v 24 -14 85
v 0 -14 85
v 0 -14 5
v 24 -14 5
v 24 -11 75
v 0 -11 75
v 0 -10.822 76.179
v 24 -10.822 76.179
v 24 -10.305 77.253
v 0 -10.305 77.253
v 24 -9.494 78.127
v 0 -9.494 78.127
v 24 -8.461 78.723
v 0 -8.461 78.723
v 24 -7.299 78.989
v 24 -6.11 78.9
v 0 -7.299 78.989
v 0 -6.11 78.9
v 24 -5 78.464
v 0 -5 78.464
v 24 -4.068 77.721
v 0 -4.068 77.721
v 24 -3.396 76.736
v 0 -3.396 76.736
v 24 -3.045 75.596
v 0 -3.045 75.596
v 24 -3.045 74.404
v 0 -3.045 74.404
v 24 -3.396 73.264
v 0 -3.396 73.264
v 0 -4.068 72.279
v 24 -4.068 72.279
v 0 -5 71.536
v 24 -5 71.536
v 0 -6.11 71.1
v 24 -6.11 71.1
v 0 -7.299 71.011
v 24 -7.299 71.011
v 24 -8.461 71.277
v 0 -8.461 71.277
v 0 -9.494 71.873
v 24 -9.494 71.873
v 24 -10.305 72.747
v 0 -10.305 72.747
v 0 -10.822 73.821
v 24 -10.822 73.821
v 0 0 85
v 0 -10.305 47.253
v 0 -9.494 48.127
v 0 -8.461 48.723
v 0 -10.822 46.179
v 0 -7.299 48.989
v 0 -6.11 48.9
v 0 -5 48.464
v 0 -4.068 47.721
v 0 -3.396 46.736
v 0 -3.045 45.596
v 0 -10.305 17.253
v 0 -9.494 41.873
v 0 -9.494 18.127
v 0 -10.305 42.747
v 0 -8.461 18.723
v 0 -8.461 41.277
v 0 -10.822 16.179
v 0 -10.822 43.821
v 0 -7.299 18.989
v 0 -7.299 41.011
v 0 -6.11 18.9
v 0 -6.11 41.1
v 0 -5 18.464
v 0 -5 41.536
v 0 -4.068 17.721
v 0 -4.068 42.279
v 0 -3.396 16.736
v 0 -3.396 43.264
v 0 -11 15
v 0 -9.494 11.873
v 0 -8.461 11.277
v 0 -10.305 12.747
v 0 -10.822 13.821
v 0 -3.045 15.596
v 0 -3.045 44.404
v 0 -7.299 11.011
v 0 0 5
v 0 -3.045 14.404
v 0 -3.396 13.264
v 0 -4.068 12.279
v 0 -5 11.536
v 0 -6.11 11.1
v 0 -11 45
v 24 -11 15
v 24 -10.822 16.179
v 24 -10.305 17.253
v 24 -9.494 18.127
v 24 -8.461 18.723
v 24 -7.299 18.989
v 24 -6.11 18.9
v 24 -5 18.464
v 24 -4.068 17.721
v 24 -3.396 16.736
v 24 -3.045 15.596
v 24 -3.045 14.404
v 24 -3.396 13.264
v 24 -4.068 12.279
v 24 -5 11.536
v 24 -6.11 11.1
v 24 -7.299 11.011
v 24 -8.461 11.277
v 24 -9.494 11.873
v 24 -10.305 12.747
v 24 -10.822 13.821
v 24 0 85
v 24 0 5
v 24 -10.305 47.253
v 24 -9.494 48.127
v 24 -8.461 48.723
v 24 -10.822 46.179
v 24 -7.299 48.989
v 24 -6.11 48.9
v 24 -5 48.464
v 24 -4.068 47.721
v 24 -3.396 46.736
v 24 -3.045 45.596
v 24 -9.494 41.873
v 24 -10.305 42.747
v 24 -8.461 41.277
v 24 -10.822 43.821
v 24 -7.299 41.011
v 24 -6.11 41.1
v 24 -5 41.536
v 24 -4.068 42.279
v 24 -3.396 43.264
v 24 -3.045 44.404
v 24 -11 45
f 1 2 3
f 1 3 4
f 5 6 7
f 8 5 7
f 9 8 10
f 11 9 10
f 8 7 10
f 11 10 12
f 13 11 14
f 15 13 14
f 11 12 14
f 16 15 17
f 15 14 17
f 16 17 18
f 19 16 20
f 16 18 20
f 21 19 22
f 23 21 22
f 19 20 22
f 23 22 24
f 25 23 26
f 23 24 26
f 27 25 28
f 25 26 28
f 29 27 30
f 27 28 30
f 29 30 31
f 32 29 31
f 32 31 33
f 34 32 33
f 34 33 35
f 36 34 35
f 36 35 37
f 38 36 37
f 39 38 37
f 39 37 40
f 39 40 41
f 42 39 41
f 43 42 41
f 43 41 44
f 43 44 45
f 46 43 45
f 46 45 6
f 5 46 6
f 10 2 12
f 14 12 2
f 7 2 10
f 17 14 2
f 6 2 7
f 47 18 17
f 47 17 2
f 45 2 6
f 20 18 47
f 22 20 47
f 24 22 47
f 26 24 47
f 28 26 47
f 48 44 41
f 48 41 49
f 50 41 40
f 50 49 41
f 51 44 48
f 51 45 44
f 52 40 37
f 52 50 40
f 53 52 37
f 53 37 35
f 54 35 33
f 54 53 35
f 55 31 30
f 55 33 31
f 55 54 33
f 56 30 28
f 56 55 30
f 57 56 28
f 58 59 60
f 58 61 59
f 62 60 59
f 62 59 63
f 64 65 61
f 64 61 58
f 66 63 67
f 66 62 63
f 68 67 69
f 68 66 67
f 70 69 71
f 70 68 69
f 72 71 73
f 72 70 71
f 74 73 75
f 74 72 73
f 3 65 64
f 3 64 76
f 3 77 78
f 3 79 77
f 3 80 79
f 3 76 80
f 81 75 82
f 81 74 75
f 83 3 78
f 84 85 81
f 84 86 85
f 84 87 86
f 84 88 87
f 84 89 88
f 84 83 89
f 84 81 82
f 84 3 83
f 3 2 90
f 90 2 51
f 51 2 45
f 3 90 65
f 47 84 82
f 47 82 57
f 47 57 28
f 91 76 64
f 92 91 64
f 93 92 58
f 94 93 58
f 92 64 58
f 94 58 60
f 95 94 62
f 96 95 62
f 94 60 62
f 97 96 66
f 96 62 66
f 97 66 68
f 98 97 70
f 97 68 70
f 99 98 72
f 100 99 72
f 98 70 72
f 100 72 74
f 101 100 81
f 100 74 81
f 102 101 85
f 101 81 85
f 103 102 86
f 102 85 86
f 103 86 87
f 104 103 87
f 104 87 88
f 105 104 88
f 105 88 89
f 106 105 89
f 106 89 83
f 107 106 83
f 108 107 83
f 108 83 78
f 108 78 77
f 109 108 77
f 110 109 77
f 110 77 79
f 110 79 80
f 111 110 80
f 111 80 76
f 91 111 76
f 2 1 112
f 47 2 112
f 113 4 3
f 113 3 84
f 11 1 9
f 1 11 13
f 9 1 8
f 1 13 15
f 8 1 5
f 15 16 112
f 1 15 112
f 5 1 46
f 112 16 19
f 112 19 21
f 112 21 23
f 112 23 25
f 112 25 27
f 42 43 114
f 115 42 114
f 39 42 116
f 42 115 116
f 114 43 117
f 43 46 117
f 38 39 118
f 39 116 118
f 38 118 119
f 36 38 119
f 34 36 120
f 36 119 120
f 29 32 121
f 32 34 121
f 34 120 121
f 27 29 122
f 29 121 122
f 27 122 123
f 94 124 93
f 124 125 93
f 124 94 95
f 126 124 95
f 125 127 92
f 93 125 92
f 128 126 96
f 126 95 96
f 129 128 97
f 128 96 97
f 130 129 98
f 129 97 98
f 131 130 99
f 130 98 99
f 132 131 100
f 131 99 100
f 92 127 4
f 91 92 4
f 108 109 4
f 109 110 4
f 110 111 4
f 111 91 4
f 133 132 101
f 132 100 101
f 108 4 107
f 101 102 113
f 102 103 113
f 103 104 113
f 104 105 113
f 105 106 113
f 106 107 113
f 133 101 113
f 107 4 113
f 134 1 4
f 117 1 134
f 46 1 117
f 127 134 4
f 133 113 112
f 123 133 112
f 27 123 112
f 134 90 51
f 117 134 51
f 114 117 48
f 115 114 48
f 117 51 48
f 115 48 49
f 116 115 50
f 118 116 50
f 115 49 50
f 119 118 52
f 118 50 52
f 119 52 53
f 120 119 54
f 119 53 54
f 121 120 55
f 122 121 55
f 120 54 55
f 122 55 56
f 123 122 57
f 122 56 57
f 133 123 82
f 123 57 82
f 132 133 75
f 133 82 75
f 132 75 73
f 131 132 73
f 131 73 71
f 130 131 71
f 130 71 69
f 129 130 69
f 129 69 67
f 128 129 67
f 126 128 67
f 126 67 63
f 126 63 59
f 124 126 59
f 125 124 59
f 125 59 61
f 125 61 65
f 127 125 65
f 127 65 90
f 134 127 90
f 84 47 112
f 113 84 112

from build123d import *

# Parameters (mm, degrees)
SKETCH_1_W          = 24
SKETCH_1_H          = 14
EXTRUDE_1_DEPTH     = 90
SKETCH_2_R          = 4
CUT_EXTRUDE_1_DEPTH = 90
SKETCH_3_W          = 5
SKETCH_3_H          = 14
CUT_EXTRUDE_2_DEPTH = 95.191294715


with BuildPart() as part:
    # 草图1 → 拉伸1 (new body)
    with BuildSketch(Plane.XY):
        with Locations((12, -7)):
            Rectangle(SKETCH_1_W, SKETCH_1_H)
    extrude(amount=EXTRUDE_1_DEPTH)

    # 草图2 → 切除-拉伸1 (cut)
    with BuildSketch(Plane.ZY):
        with Locations(Location((15, -7, 0), (0, 0, 270))):
            Circle(SKETCH_2_R)
        with Locations(Location((45, -7, 0), (0, 0, 270))):
            Circle(SKETCH_2_R)
        with Locations(Location((75, -7, 0), (0, 0, 270))):
            Circle(SKETCH_2_R)
    extrude(amount=-CUT_EXTRUDE_1_DEPTH, mode=Mode.SUBTRACT)

    # 草图3 → 切除-拉伸2 (cut, through all)
    with BuildSketch(Plane(origin=(24, 0, 0), x_dir=(0, 0, -1), z_dir=(1, 0, 0))):
        with Locations((-87.5, -7)):
            Rectangle(SKETCH_3_W, SKETCH_3_H)
        with Locations((-2.5, -7)):
            Rectangle(SKETCH_3_W, SKETCH_3_H)
    extrude(amount=-CUT_EXTRUDE_2_DEPTH, mode=Mode.SUBTRACT)


solid = part.part
